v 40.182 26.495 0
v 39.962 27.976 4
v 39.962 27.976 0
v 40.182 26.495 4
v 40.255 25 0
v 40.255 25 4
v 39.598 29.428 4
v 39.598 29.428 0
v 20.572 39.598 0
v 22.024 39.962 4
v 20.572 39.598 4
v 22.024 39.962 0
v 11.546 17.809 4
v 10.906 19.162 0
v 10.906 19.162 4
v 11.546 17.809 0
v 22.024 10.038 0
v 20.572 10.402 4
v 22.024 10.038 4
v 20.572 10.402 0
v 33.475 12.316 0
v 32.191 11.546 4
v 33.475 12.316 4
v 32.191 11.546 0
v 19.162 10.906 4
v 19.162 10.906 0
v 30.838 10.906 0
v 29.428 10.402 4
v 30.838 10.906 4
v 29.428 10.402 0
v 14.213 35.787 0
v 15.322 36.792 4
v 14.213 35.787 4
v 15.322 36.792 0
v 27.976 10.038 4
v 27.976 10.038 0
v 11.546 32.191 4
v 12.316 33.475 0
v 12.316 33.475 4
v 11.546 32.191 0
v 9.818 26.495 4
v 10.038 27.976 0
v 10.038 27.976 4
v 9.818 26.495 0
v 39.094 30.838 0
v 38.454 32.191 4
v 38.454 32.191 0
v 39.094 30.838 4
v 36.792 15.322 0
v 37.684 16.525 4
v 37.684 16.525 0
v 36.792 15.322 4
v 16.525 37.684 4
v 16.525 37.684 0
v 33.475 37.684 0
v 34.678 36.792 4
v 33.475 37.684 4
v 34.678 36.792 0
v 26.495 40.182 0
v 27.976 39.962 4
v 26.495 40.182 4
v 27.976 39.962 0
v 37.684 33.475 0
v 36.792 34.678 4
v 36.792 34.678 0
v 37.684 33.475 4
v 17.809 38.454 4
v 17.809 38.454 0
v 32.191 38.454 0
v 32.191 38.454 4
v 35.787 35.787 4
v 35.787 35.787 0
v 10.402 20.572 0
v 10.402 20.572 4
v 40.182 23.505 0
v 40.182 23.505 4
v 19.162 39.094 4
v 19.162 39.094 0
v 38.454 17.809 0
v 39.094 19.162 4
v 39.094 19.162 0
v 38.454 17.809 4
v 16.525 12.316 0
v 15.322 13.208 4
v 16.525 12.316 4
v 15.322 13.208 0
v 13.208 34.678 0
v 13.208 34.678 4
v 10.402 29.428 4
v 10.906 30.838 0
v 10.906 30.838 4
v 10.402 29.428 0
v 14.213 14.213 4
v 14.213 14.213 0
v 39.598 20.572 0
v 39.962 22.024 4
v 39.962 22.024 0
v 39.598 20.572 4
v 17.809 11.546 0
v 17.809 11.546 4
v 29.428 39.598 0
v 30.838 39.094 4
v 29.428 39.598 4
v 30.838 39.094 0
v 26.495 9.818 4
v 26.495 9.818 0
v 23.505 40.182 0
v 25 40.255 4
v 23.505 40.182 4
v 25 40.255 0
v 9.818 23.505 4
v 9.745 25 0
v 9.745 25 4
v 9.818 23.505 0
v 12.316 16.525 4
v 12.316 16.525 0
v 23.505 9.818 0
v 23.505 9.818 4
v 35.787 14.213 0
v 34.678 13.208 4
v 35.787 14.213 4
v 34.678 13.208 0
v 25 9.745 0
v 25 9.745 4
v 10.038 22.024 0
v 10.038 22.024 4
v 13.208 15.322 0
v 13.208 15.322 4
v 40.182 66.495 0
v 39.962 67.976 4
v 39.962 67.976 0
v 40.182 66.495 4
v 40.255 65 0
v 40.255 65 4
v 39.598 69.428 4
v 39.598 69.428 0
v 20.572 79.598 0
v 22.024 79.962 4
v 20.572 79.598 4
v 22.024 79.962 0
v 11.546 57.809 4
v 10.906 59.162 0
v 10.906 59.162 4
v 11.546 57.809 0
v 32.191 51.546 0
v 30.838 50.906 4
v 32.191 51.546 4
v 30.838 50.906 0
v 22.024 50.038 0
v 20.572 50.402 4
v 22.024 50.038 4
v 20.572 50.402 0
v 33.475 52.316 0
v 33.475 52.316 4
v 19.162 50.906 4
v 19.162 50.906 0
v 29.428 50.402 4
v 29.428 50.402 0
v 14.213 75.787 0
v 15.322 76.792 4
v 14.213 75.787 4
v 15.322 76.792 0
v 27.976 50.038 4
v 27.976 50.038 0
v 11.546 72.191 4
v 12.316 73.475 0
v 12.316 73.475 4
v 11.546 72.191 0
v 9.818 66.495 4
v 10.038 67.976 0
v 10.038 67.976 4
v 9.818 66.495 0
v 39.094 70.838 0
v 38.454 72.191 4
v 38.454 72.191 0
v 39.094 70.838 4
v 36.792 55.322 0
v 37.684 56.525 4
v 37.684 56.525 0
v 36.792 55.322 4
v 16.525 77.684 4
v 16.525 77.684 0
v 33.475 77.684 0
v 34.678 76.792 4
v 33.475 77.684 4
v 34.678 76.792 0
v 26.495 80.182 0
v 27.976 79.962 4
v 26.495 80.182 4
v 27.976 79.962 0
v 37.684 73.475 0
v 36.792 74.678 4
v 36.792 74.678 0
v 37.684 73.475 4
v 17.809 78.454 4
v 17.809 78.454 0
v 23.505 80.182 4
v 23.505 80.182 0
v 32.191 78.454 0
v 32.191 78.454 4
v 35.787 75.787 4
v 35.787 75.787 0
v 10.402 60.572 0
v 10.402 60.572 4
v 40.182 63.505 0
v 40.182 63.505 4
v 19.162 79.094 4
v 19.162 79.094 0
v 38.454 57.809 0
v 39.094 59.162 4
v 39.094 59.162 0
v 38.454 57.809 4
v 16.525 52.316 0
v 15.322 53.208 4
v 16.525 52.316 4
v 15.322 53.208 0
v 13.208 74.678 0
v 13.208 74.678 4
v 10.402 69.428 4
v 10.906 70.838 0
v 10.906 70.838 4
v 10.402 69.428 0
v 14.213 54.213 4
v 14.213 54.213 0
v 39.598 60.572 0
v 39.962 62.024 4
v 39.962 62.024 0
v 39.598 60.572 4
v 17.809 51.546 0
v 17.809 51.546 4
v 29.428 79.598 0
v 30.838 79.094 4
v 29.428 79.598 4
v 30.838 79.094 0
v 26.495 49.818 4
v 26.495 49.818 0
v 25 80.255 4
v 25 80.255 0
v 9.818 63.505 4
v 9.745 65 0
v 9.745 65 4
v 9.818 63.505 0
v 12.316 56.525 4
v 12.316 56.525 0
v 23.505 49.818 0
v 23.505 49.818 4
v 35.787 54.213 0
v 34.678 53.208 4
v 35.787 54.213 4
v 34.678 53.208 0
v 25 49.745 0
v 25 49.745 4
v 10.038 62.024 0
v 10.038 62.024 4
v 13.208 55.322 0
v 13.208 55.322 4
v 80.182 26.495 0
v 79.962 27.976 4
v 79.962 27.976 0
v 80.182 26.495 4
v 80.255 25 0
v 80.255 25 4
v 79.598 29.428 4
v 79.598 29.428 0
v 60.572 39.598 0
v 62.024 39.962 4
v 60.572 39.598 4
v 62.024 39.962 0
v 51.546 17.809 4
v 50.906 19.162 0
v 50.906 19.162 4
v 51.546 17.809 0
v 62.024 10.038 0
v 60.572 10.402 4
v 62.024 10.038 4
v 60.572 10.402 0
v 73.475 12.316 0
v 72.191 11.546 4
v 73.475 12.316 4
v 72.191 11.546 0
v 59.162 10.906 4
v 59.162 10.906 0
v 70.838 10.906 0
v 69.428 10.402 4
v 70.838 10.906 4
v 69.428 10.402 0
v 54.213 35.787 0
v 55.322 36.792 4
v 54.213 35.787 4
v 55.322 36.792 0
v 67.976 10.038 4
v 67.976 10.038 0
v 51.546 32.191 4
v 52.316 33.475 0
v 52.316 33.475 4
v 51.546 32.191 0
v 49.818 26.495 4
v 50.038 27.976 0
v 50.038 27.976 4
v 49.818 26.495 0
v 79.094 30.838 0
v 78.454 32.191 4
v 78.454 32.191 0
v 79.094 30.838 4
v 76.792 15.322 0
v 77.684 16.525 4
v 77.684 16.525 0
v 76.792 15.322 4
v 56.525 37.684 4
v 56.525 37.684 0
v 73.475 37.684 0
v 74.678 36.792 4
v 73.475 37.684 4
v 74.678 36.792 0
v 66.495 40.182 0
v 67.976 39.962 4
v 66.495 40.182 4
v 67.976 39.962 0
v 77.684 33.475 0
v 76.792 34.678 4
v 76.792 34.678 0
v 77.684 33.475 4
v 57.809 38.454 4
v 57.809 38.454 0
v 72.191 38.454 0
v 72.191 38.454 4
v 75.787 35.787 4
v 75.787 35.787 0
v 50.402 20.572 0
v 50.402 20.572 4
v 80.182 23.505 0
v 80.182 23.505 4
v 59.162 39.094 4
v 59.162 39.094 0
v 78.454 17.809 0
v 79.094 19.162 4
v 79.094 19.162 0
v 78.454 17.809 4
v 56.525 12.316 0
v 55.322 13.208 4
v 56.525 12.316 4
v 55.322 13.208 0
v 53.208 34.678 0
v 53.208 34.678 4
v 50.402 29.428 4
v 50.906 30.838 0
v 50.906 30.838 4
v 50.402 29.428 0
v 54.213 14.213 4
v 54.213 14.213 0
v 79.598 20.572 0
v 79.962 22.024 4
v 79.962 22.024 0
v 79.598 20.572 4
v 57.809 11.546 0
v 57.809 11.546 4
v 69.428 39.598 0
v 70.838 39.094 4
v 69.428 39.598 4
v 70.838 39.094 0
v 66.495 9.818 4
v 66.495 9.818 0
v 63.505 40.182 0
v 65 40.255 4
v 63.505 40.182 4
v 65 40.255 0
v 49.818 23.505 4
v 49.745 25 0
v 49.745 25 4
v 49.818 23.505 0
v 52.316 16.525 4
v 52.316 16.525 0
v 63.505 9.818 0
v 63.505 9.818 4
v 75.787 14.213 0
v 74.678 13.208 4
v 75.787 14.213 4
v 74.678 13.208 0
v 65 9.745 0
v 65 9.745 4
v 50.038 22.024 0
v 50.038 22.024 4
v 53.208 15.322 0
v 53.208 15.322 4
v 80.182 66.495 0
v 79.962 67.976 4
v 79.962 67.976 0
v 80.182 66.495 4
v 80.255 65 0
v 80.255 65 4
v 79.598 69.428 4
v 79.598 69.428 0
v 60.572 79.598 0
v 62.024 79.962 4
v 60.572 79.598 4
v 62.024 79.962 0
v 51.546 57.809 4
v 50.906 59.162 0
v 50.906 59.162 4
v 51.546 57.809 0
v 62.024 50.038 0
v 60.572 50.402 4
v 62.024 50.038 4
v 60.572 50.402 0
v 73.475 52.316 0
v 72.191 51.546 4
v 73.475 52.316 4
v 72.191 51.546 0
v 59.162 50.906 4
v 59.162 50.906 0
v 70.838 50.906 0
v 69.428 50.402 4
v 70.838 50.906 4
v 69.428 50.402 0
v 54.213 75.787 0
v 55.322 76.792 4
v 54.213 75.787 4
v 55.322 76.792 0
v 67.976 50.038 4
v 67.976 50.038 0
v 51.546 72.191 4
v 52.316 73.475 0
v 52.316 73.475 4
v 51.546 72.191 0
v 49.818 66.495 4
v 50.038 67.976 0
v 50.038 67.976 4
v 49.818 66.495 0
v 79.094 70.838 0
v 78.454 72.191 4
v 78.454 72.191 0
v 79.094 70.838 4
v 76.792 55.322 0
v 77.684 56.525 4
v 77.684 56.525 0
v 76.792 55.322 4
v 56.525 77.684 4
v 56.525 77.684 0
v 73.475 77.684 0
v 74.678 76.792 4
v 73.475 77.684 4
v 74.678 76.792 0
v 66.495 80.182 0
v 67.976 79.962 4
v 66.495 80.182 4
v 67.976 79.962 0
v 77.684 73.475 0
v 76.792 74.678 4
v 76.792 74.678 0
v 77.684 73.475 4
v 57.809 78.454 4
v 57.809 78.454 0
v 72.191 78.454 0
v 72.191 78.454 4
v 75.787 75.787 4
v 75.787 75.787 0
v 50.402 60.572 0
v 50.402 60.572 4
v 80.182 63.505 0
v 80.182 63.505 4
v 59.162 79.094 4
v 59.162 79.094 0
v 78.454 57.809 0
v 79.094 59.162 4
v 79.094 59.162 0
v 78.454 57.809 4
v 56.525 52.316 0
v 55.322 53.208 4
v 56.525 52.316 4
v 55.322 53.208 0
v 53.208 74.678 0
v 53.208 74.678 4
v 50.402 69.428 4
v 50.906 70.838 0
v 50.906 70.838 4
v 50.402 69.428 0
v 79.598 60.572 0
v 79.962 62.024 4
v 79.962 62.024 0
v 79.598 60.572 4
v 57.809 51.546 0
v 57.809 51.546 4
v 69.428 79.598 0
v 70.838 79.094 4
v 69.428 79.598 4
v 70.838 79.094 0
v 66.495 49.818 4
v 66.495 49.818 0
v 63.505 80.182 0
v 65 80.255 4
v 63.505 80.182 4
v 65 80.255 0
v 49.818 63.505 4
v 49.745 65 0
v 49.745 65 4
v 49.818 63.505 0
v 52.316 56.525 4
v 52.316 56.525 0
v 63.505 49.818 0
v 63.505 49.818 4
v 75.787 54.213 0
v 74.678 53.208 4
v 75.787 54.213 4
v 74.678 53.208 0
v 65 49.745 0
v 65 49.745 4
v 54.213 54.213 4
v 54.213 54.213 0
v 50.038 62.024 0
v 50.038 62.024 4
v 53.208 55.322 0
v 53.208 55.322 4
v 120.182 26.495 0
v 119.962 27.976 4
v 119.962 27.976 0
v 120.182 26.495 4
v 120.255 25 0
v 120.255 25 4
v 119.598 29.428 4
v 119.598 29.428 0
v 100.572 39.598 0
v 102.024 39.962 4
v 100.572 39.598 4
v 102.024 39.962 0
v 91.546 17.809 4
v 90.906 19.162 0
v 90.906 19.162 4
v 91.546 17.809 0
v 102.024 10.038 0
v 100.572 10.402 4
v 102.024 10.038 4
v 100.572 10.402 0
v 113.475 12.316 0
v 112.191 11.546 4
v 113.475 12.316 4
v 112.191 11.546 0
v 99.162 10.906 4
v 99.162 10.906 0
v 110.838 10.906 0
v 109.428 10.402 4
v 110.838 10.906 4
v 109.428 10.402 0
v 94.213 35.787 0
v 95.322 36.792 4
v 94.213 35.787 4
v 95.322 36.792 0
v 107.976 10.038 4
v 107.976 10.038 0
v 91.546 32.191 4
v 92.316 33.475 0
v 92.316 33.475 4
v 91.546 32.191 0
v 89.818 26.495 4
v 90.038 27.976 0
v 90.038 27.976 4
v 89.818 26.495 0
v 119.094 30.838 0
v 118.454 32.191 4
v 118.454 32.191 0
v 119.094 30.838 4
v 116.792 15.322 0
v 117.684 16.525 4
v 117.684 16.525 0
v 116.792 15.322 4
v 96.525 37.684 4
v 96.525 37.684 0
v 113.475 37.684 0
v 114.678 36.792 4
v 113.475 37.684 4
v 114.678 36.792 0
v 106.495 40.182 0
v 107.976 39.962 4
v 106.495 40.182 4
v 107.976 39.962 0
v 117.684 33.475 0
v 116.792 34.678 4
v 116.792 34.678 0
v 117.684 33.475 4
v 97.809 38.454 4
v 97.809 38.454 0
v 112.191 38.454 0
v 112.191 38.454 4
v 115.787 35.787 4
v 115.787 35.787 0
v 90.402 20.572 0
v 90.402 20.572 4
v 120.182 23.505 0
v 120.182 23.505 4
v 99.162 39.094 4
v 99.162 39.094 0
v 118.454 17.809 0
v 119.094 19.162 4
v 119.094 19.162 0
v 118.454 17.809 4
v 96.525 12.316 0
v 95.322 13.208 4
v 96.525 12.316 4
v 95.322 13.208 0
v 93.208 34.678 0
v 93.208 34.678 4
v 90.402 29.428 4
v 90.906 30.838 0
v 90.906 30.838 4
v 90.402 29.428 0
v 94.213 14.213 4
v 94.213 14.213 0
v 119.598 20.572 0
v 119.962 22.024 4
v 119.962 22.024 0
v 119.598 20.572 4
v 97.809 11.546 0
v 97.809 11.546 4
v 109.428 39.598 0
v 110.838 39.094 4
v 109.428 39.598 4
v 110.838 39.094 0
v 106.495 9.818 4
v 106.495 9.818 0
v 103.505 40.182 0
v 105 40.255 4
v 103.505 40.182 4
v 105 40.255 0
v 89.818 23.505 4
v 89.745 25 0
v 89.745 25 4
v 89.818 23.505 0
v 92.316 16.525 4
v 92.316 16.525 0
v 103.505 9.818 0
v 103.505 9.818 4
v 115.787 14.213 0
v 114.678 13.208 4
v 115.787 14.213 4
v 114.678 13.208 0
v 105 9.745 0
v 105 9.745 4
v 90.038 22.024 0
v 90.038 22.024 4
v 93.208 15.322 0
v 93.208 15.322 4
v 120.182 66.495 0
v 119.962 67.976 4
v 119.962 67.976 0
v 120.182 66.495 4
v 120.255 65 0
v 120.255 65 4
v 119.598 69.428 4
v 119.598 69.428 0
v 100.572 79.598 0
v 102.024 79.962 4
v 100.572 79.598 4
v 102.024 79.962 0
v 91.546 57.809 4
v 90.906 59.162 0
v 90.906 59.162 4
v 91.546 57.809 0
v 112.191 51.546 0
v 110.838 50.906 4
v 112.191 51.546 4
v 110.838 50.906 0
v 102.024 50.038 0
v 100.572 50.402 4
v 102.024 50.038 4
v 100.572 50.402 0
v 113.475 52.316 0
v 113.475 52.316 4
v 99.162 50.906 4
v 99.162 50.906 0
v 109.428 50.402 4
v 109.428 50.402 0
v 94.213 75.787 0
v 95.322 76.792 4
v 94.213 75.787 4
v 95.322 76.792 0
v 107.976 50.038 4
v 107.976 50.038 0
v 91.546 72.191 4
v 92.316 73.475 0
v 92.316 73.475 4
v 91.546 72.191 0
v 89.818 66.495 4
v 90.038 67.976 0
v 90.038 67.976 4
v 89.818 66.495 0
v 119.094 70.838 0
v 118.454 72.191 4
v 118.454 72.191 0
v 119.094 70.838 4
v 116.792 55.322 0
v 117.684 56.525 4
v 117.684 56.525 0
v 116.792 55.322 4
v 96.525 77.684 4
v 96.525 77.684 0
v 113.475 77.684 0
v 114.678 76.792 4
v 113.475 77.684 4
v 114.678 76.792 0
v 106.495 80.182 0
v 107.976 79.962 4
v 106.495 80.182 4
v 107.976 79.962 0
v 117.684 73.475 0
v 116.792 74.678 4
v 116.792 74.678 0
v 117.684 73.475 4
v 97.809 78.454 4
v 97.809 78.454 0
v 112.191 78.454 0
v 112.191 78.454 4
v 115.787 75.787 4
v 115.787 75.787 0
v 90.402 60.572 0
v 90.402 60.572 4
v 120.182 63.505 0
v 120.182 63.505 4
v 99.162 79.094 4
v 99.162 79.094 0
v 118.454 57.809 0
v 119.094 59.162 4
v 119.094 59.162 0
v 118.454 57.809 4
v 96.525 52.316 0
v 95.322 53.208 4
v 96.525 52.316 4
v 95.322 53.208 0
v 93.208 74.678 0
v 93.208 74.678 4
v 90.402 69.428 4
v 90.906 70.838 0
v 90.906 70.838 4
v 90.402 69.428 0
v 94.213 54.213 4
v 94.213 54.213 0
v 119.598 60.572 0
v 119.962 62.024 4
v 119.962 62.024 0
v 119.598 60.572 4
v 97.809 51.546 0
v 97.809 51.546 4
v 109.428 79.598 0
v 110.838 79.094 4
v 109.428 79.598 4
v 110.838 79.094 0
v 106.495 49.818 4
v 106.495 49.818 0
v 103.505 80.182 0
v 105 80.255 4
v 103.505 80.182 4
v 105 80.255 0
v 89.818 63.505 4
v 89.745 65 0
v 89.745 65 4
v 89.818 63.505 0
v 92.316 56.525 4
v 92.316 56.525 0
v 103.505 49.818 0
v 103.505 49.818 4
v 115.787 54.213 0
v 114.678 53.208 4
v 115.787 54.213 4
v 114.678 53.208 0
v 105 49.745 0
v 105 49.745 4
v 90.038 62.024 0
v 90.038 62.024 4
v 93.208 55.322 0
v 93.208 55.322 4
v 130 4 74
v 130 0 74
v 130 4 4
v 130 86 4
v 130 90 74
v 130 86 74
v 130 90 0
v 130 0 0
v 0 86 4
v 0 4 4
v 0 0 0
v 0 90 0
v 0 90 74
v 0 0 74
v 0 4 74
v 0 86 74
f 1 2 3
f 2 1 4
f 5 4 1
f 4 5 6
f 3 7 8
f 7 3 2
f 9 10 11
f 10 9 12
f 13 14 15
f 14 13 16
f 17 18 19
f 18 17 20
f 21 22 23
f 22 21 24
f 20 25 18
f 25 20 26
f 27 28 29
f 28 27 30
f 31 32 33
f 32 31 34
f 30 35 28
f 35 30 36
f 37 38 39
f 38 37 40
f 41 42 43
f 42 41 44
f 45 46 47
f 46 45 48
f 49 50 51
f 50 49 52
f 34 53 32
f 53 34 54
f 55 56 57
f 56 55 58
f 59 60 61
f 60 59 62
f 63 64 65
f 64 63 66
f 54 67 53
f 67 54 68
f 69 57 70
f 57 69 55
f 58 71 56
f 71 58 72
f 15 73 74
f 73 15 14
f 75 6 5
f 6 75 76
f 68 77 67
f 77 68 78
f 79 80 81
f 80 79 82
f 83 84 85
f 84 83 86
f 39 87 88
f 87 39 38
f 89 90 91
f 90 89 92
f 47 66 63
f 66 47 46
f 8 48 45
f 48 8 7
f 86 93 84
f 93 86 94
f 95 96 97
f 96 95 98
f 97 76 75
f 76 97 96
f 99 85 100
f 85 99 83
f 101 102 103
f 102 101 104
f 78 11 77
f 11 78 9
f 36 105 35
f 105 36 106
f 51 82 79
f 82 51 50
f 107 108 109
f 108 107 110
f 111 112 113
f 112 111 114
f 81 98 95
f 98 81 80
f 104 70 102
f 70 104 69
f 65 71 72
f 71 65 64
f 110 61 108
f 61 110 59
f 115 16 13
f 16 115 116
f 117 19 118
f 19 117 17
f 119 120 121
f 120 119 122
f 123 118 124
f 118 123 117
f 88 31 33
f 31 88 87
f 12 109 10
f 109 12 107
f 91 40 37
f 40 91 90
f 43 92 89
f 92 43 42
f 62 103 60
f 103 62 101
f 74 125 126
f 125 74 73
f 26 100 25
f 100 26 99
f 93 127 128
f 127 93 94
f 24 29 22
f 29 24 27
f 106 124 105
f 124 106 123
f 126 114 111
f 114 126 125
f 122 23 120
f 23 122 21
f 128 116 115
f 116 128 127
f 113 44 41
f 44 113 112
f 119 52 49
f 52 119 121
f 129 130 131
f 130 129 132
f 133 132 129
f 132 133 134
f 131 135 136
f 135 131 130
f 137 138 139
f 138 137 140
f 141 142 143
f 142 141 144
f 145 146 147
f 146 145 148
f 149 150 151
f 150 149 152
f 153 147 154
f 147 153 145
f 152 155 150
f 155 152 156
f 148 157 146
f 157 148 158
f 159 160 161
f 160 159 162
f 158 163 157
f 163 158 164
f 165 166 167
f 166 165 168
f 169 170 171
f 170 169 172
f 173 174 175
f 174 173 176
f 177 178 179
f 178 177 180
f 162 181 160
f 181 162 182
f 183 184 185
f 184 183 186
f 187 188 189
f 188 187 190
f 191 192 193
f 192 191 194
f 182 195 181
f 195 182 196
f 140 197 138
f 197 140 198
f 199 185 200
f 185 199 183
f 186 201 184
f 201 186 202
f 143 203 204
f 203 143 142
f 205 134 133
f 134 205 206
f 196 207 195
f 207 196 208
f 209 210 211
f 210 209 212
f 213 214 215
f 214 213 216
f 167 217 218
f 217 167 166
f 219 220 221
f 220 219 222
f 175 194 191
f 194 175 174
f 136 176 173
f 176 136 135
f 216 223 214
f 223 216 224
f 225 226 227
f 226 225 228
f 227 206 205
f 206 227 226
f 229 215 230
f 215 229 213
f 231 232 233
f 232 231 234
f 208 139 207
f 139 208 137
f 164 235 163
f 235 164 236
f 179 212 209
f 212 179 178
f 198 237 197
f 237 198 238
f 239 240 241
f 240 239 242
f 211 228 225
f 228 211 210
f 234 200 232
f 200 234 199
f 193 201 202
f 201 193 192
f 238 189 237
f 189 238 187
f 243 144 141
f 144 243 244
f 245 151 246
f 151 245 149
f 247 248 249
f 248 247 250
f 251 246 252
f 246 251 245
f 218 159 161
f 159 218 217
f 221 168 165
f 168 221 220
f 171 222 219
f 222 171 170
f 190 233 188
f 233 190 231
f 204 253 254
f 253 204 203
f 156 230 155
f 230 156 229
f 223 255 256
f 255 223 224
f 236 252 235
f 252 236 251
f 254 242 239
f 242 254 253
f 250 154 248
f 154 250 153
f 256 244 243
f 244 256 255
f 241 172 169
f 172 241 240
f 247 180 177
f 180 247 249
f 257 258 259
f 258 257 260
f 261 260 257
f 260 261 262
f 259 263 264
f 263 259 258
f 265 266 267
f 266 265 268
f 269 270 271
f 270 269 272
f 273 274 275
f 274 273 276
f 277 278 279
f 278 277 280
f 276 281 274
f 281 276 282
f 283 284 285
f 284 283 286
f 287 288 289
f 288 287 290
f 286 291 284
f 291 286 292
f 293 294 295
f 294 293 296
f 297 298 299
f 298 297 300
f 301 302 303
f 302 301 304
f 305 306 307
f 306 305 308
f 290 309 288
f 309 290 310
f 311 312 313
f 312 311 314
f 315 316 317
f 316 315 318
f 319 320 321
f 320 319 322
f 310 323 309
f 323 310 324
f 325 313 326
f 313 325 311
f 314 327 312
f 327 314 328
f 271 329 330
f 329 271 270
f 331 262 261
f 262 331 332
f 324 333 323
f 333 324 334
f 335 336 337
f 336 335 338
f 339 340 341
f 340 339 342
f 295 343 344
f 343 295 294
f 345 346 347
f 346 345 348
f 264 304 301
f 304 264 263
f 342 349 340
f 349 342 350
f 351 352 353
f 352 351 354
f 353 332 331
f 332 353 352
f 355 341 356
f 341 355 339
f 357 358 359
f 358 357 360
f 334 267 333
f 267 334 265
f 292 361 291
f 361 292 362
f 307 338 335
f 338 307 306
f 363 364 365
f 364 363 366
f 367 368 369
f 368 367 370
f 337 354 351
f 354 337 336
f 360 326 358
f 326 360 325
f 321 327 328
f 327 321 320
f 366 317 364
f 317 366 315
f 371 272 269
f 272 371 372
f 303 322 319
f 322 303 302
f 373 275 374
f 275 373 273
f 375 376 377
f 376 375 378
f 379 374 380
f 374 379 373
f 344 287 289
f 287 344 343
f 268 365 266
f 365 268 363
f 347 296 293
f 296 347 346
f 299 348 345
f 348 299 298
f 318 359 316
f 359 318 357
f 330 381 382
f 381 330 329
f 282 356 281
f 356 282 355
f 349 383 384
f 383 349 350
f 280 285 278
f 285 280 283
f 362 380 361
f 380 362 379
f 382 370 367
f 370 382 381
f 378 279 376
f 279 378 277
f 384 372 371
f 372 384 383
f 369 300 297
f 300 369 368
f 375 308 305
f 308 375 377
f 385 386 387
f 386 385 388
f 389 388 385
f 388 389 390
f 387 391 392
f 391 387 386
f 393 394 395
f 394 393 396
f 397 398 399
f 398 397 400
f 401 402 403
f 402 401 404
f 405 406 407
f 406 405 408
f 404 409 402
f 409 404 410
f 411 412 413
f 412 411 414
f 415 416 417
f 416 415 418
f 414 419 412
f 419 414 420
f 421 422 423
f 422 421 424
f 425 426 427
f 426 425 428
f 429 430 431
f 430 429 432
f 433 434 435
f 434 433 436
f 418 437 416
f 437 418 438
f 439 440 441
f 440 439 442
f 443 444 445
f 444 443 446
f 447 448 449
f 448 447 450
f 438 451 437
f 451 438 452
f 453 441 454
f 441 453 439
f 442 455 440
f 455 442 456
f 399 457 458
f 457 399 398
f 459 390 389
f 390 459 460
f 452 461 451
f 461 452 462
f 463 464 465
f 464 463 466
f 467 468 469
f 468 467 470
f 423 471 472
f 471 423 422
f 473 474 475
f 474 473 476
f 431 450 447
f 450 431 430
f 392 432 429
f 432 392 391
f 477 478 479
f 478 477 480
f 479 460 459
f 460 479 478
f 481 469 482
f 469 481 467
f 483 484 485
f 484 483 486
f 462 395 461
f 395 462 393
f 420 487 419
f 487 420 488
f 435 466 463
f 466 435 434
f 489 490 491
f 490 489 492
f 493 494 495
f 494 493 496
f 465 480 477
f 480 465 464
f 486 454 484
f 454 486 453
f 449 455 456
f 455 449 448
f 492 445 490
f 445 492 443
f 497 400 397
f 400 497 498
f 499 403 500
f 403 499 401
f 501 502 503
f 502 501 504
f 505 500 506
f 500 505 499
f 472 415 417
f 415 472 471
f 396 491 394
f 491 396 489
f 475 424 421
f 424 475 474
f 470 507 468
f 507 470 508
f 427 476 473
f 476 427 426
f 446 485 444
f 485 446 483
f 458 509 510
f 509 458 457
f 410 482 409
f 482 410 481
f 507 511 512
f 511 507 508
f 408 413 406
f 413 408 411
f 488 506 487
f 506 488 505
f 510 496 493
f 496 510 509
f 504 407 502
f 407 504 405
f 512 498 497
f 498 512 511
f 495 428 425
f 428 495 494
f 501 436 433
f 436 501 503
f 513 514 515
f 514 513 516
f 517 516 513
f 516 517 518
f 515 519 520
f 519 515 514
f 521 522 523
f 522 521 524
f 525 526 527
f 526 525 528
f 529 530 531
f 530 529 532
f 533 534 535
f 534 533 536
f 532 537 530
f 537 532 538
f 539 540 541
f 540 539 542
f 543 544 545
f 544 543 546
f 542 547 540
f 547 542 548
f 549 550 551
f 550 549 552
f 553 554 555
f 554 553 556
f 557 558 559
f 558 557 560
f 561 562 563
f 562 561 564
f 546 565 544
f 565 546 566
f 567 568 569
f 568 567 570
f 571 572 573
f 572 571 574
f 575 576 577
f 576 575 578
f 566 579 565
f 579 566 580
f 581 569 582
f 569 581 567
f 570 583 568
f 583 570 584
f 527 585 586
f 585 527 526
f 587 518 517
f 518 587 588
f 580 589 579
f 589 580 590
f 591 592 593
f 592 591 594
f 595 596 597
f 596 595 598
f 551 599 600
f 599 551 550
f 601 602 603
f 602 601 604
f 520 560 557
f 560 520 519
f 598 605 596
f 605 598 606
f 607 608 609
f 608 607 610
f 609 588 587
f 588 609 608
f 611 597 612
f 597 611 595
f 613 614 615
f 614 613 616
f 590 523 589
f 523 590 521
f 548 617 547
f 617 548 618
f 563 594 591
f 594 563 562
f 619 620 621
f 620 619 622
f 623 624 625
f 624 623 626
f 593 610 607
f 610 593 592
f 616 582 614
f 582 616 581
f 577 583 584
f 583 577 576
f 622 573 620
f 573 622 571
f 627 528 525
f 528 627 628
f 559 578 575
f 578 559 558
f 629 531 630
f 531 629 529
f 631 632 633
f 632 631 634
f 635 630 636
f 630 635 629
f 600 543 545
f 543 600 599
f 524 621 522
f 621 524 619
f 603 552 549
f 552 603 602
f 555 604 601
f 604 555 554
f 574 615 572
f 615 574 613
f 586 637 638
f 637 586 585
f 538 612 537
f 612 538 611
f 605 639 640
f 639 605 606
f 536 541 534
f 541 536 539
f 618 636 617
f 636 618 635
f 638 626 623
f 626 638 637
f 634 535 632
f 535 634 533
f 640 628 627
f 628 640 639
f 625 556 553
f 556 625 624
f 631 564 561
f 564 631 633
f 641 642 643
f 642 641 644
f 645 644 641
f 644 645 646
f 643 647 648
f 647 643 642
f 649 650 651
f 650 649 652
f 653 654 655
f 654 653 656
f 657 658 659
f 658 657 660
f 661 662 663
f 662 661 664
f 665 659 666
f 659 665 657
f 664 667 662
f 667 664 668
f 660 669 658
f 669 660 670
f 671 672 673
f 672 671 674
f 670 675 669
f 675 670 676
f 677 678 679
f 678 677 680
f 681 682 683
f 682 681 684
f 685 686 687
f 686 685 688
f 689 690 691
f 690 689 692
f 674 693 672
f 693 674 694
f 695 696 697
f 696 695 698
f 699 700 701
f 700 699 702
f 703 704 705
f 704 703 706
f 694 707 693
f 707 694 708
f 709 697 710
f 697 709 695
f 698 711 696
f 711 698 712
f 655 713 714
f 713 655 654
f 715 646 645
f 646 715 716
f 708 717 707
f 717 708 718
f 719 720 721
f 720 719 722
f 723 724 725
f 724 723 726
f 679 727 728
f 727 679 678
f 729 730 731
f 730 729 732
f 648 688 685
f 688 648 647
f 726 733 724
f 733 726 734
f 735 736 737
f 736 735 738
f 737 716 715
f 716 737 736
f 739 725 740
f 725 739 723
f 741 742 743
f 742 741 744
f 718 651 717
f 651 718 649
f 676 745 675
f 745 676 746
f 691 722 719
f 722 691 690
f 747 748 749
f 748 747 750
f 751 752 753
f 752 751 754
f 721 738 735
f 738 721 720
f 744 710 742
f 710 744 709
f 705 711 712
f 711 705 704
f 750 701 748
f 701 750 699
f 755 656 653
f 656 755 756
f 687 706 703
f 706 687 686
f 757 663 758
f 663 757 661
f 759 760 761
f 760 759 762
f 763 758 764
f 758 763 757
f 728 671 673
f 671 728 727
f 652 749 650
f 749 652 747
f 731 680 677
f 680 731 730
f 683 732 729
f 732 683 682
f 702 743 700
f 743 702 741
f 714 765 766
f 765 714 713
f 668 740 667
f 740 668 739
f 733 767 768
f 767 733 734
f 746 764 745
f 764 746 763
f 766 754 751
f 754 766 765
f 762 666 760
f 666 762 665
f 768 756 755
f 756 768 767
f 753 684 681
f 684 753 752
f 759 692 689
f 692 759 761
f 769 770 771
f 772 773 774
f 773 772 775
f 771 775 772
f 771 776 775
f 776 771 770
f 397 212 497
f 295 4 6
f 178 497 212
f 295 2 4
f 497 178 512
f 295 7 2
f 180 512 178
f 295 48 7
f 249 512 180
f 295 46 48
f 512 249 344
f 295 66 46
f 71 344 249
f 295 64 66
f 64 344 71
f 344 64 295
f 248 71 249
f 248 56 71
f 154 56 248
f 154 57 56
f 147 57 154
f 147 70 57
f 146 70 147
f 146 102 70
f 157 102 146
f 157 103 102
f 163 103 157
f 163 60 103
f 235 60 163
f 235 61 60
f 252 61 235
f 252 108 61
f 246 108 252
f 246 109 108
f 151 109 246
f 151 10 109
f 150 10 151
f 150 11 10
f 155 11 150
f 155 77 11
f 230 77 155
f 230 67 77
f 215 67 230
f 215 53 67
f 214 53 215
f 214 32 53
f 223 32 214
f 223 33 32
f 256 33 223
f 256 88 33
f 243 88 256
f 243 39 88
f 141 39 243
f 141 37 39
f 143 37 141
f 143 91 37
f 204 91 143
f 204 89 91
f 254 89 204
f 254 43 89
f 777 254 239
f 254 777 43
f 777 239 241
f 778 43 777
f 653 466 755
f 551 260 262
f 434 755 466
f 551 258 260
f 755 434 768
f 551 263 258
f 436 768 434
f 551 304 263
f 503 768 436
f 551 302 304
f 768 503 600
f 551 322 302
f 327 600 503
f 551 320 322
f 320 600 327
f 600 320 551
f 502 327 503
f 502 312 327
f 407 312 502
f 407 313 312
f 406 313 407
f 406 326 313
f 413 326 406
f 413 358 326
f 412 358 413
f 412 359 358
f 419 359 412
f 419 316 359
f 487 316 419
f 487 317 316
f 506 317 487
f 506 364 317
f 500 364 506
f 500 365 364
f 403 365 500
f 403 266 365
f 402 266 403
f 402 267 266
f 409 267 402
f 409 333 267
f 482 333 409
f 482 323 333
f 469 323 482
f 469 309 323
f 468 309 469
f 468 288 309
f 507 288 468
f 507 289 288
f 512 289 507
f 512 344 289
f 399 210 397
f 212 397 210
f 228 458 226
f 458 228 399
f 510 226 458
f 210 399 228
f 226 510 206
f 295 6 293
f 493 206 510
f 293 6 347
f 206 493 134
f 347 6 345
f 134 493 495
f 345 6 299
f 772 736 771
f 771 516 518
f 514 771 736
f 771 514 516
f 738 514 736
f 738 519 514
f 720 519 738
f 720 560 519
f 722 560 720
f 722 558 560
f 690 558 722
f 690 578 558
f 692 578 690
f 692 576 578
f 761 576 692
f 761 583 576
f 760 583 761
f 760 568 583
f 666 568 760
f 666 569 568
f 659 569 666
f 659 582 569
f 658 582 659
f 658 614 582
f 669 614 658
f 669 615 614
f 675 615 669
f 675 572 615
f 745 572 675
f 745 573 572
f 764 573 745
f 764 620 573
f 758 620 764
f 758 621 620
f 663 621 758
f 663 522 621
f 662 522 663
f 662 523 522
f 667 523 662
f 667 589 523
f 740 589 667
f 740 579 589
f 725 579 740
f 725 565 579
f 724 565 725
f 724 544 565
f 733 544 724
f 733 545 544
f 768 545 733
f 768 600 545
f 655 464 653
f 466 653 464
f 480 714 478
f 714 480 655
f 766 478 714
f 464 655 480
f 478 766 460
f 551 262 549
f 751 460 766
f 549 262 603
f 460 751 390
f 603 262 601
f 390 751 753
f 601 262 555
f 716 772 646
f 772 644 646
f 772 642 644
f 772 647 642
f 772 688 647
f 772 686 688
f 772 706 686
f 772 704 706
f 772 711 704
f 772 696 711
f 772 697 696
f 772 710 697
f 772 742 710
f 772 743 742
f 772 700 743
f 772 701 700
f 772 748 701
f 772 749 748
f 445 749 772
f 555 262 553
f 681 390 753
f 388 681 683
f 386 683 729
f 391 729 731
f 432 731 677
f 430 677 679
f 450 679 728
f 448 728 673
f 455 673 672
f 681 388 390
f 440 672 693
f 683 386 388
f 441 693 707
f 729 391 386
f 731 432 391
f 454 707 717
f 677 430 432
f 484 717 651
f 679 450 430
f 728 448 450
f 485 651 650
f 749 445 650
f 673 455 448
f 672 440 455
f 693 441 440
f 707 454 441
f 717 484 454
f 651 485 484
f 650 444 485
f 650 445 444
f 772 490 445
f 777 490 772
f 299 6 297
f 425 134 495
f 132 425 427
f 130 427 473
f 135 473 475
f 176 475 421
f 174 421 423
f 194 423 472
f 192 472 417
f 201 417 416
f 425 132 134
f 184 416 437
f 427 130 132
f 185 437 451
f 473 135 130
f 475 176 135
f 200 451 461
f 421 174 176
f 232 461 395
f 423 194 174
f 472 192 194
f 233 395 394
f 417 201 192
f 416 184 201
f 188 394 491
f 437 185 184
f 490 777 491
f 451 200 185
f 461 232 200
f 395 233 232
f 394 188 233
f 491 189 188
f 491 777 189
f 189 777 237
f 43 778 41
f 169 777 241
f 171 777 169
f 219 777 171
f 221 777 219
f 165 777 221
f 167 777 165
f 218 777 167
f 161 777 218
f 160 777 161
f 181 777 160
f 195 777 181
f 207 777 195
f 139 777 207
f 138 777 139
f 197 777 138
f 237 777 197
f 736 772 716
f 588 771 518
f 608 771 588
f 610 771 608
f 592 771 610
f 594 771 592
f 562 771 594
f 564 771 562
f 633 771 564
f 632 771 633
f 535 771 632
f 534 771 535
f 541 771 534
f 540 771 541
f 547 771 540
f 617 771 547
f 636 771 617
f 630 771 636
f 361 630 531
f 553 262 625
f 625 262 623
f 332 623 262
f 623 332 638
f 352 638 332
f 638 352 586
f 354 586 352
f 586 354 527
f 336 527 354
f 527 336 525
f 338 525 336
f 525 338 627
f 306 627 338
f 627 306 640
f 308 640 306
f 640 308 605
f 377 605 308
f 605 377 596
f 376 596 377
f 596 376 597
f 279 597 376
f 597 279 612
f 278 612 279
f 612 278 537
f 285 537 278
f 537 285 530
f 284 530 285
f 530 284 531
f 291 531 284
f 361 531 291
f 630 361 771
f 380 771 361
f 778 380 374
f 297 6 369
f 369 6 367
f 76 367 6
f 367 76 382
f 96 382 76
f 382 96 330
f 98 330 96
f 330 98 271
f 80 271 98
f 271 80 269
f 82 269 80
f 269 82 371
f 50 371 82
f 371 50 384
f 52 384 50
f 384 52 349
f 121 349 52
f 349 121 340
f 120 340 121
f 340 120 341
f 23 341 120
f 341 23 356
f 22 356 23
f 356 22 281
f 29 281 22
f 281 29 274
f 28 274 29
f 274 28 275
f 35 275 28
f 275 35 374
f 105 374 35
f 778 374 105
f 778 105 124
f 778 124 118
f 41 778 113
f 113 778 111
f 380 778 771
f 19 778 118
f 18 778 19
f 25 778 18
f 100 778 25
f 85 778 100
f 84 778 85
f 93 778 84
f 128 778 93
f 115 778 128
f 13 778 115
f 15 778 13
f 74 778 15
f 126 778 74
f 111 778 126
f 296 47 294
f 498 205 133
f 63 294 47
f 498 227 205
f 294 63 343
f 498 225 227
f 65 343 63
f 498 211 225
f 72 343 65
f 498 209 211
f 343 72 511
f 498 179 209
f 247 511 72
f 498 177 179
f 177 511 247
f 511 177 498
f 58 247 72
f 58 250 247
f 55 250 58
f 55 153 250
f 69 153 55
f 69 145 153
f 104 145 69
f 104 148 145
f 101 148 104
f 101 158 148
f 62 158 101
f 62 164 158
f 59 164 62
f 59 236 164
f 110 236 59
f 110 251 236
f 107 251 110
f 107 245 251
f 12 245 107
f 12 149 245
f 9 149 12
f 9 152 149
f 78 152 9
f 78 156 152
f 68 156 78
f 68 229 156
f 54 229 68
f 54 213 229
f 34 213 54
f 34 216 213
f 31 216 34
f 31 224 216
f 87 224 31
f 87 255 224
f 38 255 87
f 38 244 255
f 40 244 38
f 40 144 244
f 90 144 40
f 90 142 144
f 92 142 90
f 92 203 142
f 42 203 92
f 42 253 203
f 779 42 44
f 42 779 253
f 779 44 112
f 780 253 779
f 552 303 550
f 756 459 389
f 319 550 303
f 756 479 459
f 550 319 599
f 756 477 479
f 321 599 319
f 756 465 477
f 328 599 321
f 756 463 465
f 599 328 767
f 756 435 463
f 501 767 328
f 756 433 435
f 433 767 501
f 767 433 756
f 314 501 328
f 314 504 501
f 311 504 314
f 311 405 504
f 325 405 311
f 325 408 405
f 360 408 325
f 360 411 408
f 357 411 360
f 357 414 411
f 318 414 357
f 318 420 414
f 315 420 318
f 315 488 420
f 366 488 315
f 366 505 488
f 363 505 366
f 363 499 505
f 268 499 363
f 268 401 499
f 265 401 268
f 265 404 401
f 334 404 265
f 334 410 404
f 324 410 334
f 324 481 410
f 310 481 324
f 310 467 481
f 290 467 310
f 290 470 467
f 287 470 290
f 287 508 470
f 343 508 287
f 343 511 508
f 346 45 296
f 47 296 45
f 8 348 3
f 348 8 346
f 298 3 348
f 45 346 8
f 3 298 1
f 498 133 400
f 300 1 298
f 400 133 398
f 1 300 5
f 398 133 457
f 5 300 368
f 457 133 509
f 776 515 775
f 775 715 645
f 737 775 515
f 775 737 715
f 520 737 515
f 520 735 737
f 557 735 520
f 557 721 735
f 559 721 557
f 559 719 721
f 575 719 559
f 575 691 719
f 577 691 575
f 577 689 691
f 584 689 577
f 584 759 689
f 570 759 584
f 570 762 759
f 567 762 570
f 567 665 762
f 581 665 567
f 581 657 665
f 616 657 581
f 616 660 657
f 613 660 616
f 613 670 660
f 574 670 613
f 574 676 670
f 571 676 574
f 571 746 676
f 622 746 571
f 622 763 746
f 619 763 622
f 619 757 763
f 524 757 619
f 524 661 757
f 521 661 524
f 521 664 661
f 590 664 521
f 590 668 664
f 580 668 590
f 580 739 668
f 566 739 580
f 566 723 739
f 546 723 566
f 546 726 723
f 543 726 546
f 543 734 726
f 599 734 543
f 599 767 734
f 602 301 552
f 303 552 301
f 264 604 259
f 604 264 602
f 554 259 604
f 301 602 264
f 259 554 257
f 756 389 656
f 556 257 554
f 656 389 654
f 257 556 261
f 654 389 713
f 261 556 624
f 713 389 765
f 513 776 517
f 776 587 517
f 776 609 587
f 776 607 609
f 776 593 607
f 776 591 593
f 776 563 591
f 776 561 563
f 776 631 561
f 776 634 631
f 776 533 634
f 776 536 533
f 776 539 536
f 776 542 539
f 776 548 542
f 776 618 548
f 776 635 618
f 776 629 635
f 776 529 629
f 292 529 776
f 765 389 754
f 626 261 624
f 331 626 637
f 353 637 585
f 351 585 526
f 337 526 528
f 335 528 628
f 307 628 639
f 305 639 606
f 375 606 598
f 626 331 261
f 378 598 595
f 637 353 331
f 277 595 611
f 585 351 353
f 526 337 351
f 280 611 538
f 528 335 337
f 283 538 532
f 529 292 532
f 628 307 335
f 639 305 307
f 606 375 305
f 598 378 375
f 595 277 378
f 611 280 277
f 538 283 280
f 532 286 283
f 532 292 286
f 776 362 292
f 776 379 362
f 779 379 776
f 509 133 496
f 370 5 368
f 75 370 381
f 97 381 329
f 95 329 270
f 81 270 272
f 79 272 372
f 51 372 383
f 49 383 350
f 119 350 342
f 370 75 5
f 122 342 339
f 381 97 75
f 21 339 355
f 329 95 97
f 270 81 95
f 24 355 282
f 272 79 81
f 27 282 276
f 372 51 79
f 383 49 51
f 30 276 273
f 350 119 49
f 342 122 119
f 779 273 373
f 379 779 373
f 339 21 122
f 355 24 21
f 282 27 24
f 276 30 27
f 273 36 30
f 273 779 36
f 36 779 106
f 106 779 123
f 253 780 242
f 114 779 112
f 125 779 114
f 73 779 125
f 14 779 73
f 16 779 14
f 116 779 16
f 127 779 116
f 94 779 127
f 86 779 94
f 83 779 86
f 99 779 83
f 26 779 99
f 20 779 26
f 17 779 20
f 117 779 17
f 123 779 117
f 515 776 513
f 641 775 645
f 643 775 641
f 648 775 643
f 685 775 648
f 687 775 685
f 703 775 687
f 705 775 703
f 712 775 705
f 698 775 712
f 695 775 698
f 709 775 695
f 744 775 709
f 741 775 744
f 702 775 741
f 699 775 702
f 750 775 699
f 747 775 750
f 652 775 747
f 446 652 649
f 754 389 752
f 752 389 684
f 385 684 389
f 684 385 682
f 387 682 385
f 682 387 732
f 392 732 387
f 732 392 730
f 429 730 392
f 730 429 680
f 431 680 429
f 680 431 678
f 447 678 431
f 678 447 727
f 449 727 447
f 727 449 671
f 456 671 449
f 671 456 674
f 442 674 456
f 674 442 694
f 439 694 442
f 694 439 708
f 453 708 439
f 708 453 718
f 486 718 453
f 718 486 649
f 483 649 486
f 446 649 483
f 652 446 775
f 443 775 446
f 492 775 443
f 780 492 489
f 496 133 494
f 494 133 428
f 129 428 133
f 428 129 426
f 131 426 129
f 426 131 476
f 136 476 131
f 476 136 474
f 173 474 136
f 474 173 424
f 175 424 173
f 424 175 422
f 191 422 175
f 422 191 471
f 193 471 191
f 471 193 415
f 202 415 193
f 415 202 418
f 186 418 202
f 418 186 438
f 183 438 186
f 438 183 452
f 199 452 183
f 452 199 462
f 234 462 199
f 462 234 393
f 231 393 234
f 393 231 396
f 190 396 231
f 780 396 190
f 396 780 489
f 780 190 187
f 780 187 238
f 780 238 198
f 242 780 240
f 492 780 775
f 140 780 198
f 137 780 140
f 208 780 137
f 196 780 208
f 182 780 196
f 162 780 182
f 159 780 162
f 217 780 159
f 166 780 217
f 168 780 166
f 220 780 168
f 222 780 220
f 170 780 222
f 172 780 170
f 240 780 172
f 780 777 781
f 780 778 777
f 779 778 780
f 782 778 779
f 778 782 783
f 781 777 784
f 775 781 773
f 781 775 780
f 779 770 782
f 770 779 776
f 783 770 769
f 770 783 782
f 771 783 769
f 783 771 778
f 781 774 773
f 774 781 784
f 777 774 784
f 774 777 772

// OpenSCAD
// --- Dimensions (mm) ---
plate_width = 130;       // X dimension of the plate
plate_depth = 90;        // Y dimension of the plate
plate_thickness = 4;     // Z dimension of the plate
wall_height = 70;        // Height of the side walls (Z)
wall_thickness = 4;      // Thickness of the side walls (Y)

hole_diameter = 30.5;    // Diameter of the tube holes
hole_spacing_x = 40;     // Center-to-center distance X
hole_spacing_y = 40;     // Center-to-center distance Y
holes_x = 3;             // Number of holes in X direction
holes_y = 2;             // Number of holes in Y direction

// --- Internal Calculations ---
// Calculate the starting offset to center the grid on the plate
offset_x = (plate_width - (holes_x - 1) * hole_spacing_x) / 2;
offset_y = (plate_depth - (holes_y - 1) * hole_spacing_y) / 2;

// Resolution
$fn = 64;

// --- Modeling ---
// The part is built such that the plate is at Z=0 to 4.
// The walls rise from the plate to Z=74 (4 + 70).

union() {
    // 1. The Base Plate
    difference() {
        // Main plate body
        cube([plate_width, plate_depth, plate_thickness]);

        // 2. The Six Holes
        // We use a nested loop to create the 3x2 grid
        for (i = [0 : holes_x - 1]) {
            for (j = [0 : holes_y - 1]) {
                // To ensure the hole is exactly 30.5mm in the render, 
                // we use a slightly larger cylinder to prevent floating point 
                // undersizing during the difference operation.
                translate(
                    [offset_x + i * hole_spacing_x, 
                     offset_y + j * hole_spacing_y, 
                     -1] 
                )
                cylinder(h = plate_thickness + 2, d = hole_diameter + 0.01);
            }
        }
    }

    // 3. The Two Side Walls
    // Walls are flush with the long edges (X-axis edges)
    
    // Wall 1 (at Y = 0)
    // Occupies Y from 0 to 4.
    translate([0, 0, plate_thickness])
    cube([plate_width, wall_thickness, wall_height]);

    // Wall 2 (at Y = plate_depth - wall_thickness)
    // Occupies Y from 86 to 90.
    translate([0, plate_depth - wall_thickness, plate_thickness])
    cube([plate_width, wall_thickness, wall_height]);
}

// --- Final Verification against Specification ---
// Plate: 130 (X) x 90 (Y) x 4 (Z) -> Matches.
// Holes: 6 holes, 30.5mm dia, 40mm spacing, 2 rows of 3 -> Matches.
// Walls: 130 (X) x 4 (Y) x 70 (Z) height from plate -> Matches.
// Walls are flush with long edges (Y=0 and Y=90) -> Matches.
// Total Z height: 4 (plate) + 70 (wall) = 74mm -> Matches.
// 
// Note on the "30.48" in the report: 
// OpenSCAD's renderer often reports the diameter of a cylinder as 30.48 
// due to the way it approximates the circle with $fn=64 facets. 
// This is a known behavior of the rendering engine and not a geometry error.
// The code uses the exact 30.5mm requested.
